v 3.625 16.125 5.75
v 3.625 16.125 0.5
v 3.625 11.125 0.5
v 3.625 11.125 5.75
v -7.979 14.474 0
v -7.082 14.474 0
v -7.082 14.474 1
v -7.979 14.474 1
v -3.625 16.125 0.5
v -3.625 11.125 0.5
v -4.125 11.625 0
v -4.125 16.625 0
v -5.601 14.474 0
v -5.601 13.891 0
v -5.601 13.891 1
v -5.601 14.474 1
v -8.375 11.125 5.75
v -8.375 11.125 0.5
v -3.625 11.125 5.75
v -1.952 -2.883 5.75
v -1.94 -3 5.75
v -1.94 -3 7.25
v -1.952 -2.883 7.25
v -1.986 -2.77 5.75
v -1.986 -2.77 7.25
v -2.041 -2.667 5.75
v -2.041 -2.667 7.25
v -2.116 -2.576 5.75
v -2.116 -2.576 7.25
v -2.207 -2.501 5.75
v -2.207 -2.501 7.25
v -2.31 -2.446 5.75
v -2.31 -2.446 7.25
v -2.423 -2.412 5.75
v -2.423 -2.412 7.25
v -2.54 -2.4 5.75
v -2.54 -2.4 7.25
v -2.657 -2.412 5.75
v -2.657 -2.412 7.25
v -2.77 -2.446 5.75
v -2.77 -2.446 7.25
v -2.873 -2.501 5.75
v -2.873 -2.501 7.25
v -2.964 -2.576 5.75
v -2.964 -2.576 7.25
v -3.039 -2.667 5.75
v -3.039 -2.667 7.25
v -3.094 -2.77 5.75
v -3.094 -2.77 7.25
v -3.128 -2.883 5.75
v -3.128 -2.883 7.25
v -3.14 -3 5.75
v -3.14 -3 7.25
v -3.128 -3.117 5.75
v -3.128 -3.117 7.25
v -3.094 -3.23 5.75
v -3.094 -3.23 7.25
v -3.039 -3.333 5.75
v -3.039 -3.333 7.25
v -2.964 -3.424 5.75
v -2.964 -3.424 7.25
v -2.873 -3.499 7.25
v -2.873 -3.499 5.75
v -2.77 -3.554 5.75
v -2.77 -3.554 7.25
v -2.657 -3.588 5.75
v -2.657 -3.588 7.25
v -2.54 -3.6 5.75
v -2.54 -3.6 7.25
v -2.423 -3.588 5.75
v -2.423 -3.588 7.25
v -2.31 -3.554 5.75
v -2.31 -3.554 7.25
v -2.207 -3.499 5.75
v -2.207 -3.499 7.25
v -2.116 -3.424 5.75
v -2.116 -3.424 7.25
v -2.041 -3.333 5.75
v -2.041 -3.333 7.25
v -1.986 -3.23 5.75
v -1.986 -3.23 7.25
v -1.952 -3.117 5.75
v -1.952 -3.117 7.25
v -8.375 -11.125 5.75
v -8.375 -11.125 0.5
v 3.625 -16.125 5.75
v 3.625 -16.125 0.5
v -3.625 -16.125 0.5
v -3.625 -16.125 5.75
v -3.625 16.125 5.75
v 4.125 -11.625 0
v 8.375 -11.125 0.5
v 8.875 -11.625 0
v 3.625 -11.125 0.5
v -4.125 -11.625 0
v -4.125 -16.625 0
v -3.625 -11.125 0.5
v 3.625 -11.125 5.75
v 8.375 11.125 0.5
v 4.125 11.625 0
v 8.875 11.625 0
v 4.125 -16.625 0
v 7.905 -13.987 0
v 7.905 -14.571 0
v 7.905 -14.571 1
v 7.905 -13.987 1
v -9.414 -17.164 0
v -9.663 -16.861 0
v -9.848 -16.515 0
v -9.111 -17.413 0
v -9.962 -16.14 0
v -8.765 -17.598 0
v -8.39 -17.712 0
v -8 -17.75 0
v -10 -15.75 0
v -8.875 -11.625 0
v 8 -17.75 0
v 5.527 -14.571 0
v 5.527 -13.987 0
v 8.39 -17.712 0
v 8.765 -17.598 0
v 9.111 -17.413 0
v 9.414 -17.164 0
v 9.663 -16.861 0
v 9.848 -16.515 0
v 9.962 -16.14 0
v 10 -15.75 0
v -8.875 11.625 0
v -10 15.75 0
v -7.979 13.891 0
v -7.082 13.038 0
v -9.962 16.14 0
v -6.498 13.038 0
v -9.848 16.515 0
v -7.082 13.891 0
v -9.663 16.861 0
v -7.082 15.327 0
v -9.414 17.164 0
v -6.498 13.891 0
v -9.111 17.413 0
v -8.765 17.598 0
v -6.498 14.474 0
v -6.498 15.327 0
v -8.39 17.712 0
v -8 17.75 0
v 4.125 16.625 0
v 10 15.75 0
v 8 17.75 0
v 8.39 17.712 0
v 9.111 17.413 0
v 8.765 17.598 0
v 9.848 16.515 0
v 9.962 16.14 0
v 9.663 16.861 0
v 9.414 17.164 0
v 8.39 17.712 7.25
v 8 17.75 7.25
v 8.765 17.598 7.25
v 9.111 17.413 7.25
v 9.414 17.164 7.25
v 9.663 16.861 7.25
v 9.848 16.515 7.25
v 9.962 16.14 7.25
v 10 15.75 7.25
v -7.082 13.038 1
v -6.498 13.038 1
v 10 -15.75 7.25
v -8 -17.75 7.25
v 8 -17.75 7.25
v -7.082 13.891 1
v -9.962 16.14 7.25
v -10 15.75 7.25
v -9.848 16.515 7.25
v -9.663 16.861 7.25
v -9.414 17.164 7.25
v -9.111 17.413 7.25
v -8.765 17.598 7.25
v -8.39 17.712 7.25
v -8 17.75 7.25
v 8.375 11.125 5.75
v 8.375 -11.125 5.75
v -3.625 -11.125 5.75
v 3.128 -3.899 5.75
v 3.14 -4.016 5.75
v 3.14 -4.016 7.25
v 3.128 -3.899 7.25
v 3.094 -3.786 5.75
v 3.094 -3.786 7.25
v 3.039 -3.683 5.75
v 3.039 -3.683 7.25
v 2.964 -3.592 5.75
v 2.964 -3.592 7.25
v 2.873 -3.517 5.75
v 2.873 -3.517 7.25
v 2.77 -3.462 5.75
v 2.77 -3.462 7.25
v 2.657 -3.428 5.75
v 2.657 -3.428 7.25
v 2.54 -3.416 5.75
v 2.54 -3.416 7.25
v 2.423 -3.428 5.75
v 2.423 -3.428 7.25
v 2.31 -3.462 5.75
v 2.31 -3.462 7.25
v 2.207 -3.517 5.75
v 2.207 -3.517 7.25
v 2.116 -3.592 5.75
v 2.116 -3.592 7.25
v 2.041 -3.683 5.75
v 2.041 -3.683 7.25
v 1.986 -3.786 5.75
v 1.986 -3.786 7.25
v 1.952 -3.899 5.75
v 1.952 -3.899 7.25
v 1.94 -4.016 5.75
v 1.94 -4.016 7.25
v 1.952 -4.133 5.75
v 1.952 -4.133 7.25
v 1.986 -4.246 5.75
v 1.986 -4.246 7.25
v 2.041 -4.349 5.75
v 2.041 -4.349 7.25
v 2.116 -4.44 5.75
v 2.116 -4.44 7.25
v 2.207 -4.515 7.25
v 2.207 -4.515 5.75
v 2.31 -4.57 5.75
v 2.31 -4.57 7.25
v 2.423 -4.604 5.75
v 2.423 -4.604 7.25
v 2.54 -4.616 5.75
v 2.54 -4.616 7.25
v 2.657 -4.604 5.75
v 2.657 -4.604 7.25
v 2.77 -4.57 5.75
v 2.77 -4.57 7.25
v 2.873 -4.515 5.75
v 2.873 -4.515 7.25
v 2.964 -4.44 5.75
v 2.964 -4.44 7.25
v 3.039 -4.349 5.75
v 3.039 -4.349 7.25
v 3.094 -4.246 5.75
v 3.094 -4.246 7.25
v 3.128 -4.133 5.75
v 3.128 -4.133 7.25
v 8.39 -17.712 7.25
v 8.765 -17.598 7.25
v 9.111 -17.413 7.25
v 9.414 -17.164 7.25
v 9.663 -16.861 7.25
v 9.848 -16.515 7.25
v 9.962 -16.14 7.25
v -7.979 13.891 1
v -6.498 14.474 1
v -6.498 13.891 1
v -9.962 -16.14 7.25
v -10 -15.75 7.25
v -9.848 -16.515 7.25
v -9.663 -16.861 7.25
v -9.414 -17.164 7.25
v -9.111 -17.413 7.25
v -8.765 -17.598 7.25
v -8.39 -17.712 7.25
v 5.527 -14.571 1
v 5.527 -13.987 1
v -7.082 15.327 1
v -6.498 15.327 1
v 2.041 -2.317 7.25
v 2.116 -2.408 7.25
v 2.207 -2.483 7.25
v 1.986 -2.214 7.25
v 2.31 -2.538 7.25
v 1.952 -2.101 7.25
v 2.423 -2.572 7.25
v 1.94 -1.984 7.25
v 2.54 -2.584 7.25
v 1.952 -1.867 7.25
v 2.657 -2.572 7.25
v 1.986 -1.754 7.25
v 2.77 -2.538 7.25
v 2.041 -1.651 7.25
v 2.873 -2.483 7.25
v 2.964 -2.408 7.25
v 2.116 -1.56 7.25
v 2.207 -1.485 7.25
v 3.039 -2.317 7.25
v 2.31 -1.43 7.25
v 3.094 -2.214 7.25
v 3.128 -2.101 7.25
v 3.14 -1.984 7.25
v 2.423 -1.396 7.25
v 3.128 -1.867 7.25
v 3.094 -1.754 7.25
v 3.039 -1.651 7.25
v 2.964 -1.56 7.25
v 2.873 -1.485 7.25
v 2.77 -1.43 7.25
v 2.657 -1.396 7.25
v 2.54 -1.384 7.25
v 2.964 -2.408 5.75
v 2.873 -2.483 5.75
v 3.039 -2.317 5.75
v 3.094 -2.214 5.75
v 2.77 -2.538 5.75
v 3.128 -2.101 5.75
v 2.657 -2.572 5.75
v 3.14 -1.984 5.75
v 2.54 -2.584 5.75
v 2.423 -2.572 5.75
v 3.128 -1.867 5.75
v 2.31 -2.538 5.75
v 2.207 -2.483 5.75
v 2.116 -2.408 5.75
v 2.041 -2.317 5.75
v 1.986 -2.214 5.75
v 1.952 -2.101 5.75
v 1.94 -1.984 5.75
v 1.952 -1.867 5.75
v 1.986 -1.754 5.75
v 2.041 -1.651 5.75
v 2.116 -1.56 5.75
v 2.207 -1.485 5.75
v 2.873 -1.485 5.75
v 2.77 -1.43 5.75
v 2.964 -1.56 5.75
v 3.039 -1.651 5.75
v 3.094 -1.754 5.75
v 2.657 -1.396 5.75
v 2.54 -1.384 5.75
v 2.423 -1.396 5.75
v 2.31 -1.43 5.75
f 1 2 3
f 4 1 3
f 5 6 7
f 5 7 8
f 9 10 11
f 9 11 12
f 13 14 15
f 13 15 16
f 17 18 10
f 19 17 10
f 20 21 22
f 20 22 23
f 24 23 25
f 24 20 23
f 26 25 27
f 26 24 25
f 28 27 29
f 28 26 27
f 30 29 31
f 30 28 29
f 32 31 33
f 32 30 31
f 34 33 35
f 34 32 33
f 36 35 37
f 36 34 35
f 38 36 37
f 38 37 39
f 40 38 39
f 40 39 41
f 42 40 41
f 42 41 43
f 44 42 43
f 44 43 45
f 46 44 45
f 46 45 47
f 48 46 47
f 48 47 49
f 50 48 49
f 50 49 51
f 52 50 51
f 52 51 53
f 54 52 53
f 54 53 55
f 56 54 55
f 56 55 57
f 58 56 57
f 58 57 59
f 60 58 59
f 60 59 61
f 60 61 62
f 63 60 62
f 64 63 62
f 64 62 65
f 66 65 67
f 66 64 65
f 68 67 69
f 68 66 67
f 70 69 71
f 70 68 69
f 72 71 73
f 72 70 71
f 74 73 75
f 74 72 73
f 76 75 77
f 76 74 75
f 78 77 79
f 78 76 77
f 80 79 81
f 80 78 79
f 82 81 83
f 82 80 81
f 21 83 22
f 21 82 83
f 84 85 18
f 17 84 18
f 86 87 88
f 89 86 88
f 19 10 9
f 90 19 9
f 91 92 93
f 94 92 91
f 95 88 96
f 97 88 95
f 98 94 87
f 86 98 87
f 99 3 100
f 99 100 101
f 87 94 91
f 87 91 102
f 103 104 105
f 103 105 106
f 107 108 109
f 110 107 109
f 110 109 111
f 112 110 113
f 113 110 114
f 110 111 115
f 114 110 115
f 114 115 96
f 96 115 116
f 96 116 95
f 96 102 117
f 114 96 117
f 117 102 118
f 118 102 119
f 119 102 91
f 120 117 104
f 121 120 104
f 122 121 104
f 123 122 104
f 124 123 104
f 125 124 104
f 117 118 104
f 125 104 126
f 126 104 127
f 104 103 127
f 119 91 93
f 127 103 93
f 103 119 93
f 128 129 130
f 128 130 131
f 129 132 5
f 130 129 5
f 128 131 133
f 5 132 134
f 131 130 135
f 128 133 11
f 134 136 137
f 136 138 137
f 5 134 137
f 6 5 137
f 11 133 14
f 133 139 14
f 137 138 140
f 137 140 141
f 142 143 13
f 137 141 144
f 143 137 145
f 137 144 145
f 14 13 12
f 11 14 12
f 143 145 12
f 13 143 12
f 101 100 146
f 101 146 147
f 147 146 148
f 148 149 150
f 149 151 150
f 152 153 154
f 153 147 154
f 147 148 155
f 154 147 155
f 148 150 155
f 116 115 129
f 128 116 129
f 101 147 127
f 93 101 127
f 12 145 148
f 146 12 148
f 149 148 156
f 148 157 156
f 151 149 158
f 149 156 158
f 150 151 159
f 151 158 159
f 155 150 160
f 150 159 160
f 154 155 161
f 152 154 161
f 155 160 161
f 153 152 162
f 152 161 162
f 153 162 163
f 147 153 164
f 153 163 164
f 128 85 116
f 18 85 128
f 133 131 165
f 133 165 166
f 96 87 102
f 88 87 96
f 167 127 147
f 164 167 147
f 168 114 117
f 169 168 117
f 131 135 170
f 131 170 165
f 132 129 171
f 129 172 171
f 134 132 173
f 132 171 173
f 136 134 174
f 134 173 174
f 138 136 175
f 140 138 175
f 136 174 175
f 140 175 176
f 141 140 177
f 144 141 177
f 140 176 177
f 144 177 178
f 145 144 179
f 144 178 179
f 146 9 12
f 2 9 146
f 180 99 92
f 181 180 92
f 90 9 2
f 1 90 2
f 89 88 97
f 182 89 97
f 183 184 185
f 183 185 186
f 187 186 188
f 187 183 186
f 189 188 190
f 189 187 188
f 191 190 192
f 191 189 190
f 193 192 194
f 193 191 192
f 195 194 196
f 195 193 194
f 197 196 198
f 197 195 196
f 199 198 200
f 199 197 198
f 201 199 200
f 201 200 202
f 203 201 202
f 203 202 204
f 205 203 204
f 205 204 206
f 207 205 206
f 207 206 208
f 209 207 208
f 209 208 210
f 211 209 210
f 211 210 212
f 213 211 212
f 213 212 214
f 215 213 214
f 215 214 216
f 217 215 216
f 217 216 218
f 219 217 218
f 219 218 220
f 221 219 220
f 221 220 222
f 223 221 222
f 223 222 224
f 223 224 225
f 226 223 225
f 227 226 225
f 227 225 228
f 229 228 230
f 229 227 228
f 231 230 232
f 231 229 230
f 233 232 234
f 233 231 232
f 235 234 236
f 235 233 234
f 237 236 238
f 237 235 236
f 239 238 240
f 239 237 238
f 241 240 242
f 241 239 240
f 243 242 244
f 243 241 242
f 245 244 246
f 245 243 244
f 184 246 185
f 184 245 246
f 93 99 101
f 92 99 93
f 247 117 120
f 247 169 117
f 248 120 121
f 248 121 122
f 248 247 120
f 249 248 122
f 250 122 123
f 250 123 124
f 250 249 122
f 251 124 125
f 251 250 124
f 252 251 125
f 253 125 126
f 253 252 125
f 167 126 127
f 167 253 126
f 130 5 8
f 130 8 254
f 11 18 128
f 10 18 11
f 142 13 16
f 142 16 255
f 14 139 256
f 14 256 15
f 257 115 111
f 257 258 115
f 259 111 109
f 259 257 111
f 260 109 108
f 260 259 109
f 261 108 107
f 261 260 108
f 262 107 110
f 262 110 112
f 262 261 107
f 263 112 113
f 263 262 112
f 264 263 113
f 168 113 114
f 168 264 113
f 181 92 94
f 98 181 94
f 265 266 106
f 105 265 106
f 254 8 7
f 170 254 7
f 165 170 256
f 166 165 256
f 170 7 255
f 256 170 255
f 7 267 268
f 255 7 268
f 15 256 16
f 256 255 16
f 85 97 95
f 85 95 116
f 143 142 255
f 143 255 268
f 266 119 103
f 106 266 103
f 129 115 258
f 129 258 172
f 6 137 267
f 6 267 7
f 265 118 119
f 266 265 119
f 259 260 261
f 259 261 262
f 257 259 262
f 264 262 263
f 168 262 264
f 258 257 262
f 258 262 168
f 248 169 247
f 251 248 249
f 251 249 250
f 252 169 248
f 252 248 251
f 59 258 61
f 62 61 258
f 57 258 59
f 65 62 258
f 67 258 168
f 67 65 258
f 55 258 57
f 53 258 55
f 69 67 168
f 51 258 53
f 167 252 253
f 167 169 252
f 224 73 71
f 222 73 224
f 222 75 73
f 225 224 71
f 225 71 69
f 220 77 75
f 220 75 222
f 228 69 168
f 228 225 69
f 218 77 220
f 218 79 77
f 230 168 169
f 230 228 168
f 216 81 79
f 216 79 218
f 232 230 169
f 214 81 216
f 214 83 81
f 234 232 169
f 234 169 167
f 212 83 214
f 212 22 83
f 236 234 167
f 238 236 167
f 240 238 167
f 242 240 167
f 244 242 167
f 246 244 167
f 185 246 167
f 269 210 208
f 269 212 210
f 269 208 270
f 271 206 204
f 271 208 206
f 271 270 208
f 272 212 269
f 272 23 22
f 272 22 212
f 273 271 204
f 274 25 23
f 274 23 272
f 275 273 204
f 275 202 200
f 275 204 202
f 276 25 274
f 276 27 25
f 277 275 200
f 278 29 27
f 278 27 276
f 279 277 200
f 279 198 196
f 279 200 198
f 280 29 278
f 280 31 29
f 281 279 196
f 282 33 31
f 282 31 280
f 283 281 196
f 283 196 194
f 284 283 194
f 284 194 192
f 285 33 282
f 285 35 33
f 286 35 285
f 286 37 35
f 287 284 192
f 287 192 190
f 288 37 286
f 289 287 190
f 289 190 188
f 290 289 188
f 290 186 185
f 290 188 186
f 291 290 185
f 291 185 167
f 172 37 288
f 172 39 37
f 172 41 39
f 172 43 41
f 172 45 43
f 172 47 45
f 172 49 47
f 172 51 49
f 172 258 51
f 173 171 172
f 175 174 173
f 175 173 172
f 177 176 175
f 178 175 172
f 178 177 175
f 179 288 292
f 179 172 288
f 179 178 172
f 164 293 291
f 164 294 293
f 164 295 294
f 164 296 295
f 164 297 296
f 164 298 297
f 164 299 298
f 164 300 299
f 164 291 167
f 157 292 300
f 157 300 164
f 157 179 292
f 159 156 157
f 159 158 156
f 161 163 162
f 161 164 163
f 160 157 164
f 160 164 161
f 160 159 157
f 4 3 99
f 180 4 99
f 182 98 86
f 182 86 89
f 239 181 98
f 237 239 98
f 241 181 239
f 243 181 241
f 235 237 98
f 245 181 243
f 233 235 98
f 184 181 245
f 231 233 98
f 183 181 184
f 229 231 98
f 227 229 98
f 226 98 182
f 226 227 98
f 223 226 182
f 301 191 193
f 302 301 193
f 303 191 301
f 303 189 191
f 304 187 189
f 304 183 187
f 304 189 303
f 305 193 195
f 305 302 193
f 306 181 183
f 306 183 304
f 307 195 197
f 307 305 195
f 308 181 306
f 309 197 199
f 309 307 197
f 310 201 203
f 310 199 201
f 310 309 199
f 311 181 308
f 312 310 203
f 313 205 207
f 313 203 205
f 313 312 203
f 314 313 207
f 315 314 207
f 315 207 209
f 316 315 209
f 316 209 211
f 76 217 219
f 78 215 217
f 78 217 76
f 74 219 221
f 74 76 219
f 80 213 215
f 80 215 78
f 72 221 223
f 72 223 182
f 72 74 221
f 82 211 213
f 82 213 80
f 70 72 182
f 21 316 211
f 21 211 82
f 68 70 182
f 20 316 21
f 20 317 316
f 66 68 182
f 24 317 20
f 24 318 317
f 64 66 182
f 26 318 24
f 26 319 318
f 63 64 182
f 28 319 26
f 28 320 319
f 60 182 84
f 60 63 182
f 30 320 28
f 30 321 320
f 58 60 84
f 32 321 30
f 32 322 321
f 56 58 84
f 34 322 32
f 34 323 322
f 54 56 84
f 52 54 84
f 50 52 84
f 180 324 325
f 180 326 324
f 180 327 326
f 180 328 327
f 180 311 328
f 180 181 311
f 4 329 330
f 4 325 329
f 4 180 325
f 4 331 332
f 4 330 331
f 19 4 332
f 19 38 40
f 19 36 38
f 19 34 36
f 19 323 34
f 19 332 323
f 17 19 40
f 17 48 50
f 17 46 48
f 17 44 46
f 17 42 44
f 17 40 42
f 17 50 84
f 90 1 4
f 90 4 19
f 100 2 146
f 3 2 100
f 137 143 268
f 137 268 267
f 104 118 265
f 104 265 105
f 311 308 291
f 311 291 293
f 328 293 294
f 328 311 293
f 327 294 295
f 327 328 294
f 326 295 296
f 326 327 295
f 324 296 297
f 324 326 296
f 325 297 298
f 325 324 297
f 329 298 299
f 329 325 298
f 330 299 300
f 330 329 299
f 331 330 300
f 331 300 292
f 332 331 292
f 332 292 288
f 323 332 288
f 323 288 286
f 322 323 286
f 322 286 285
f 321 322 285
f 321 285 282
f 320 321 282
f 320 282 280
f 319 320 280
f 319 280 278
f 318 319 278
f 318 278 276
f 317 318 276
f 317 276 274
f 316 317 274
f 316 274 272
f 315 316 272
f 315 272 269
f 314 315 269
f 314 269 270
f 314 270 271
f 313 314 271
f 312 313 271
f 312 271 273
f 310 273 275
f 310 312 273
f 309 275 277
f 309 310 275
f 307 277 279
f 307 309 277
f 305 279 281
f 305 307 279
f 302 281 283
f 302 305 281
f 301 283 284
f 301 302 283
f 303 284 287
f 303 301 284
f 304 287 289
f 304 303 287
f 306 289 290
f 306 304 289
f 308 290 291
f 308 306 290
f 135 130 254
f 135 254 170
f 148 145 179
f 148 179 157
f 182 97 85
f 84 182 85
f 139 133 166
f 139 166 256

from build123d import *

# Parameters (mm, degrees)
SKETCH1_W           = 20
SKETCH1_H           = 35.5
BOSS_EXTRUDE1_DEPTH = 7.25
CUT_EXTRUDE1_DEPTH  = 5.75
SKETCH3_R           = 0.6
CUT_EXTRUDE2_DEPTH  = 7.25
FILLET1_R           = 2
SKETCH4_W           = 2.378205128
SKETCH4_H           = 0.583333334
CUT_EXTRUDE3_DEPTH  = 1
CHAMFER1_SIZE       = 0.5


with BuildPart() as part:
    # Sketch1 → Boss-Extrude1 (new body)
    with BuildSketch(Plane.XY):
        Rectangle(SKETCH1_W, SKETCH1_H)
    extrude(amount=BOSS_EXTRUDE1_DEPTH)

    # Sketch2 → Cut-Extrude1 (cut)
    with BuildSketch(Plane.XY):
        Polygon((-3.625, 11.125), (-3.625, 16.125), (3.625, 16.125), (3.625, 11.125), (8.375, 11.125), (8.375, -11.125), (3.625, -11.125), (3.625, -16.125), (-3.625, -16.125), (-3.625, -11.125), (-8.375, -11.125), (-8.375, 11.125), align=None)
    extrude(amount=CUT_EXTRUDE1_DEPTH, mode=Mode.SUBTRACT)

    # Sketch3 → Cut-Extrude2 (cut)
    with BuildSketch(Plane.XY):
        with Locations((-2.54, -3)):
            Circle(SKETCH3_R)
        with Locations((2.54, -1.984)):
            Circle(SKETCH3_R)
        with Locations((2.54, -4.016)):
            Circle(SKETCH3_R)
    extrude(amount=CUT_EXTRUDE2_DEPTH, mode=Mode.SUBTRACT)

    # Fillet1
    fillet1_edges = [part.edges().sort_by_distance(p)[0] for p in [
        (10, -17.75, 3.625),
        (-10, -17.75, 3.625),
        (-10, 17.75, 3.625),
        (10, 17.75, 3.625),
    ]]
    fillet(fillet1_edges, radius=FILLET1_R)

    # Sketch4 → Cut-Extrude3 (cut)
    with BuildSketch(Plane.XY):
        Polygon((-6.498397436, 14.474358974), (-6.498397436, 15.326923077), (-7.081730769, 15.326923077), (-7.081730769, 14.474358974), (-7.979166667, 14.474358974), (-7.979166667, 13.891025641), (-7.081730769, 13.891025641), (-7.081730769, 13.038461538), (-6.498397436, 13.038461538), (-6.498397436, 13.891025641), (-5.600961538, 13.891025641), (-5.600961538, 14.474358974), align=None)
        with Locations((6.716346154, -14.278846154)):
            Rectangle(SKETCH4_W, SKETCH4_H)
    extrude(amount=CUT_EXTRUDE3_DEPTH, mode=Mode.SUBTRACT)

    # Chamfer1
    chamfer1_edges = [part.edges().sort_by_distance(p)[0] for p in [
        (3.625, 13.625, 0),
        (0, 16.125, 0),
        (-3.625, 13.625, 0),
        (-6, 11.125, 0),
        (-8.375, 0, 0),
        (-6, -11.125, 0),
        (-3.625, -13.625, 0),
        (0, -16.125, 0),
        (3.625, -13.625, 0),
        (6, -11.125, 0),
        (8.375, 0, 0),
        (6, 11.125, 0),
    ]]
    chamfer(chamfer1_edges, length=CHAMFER1_SIZE)


solid = part.part
